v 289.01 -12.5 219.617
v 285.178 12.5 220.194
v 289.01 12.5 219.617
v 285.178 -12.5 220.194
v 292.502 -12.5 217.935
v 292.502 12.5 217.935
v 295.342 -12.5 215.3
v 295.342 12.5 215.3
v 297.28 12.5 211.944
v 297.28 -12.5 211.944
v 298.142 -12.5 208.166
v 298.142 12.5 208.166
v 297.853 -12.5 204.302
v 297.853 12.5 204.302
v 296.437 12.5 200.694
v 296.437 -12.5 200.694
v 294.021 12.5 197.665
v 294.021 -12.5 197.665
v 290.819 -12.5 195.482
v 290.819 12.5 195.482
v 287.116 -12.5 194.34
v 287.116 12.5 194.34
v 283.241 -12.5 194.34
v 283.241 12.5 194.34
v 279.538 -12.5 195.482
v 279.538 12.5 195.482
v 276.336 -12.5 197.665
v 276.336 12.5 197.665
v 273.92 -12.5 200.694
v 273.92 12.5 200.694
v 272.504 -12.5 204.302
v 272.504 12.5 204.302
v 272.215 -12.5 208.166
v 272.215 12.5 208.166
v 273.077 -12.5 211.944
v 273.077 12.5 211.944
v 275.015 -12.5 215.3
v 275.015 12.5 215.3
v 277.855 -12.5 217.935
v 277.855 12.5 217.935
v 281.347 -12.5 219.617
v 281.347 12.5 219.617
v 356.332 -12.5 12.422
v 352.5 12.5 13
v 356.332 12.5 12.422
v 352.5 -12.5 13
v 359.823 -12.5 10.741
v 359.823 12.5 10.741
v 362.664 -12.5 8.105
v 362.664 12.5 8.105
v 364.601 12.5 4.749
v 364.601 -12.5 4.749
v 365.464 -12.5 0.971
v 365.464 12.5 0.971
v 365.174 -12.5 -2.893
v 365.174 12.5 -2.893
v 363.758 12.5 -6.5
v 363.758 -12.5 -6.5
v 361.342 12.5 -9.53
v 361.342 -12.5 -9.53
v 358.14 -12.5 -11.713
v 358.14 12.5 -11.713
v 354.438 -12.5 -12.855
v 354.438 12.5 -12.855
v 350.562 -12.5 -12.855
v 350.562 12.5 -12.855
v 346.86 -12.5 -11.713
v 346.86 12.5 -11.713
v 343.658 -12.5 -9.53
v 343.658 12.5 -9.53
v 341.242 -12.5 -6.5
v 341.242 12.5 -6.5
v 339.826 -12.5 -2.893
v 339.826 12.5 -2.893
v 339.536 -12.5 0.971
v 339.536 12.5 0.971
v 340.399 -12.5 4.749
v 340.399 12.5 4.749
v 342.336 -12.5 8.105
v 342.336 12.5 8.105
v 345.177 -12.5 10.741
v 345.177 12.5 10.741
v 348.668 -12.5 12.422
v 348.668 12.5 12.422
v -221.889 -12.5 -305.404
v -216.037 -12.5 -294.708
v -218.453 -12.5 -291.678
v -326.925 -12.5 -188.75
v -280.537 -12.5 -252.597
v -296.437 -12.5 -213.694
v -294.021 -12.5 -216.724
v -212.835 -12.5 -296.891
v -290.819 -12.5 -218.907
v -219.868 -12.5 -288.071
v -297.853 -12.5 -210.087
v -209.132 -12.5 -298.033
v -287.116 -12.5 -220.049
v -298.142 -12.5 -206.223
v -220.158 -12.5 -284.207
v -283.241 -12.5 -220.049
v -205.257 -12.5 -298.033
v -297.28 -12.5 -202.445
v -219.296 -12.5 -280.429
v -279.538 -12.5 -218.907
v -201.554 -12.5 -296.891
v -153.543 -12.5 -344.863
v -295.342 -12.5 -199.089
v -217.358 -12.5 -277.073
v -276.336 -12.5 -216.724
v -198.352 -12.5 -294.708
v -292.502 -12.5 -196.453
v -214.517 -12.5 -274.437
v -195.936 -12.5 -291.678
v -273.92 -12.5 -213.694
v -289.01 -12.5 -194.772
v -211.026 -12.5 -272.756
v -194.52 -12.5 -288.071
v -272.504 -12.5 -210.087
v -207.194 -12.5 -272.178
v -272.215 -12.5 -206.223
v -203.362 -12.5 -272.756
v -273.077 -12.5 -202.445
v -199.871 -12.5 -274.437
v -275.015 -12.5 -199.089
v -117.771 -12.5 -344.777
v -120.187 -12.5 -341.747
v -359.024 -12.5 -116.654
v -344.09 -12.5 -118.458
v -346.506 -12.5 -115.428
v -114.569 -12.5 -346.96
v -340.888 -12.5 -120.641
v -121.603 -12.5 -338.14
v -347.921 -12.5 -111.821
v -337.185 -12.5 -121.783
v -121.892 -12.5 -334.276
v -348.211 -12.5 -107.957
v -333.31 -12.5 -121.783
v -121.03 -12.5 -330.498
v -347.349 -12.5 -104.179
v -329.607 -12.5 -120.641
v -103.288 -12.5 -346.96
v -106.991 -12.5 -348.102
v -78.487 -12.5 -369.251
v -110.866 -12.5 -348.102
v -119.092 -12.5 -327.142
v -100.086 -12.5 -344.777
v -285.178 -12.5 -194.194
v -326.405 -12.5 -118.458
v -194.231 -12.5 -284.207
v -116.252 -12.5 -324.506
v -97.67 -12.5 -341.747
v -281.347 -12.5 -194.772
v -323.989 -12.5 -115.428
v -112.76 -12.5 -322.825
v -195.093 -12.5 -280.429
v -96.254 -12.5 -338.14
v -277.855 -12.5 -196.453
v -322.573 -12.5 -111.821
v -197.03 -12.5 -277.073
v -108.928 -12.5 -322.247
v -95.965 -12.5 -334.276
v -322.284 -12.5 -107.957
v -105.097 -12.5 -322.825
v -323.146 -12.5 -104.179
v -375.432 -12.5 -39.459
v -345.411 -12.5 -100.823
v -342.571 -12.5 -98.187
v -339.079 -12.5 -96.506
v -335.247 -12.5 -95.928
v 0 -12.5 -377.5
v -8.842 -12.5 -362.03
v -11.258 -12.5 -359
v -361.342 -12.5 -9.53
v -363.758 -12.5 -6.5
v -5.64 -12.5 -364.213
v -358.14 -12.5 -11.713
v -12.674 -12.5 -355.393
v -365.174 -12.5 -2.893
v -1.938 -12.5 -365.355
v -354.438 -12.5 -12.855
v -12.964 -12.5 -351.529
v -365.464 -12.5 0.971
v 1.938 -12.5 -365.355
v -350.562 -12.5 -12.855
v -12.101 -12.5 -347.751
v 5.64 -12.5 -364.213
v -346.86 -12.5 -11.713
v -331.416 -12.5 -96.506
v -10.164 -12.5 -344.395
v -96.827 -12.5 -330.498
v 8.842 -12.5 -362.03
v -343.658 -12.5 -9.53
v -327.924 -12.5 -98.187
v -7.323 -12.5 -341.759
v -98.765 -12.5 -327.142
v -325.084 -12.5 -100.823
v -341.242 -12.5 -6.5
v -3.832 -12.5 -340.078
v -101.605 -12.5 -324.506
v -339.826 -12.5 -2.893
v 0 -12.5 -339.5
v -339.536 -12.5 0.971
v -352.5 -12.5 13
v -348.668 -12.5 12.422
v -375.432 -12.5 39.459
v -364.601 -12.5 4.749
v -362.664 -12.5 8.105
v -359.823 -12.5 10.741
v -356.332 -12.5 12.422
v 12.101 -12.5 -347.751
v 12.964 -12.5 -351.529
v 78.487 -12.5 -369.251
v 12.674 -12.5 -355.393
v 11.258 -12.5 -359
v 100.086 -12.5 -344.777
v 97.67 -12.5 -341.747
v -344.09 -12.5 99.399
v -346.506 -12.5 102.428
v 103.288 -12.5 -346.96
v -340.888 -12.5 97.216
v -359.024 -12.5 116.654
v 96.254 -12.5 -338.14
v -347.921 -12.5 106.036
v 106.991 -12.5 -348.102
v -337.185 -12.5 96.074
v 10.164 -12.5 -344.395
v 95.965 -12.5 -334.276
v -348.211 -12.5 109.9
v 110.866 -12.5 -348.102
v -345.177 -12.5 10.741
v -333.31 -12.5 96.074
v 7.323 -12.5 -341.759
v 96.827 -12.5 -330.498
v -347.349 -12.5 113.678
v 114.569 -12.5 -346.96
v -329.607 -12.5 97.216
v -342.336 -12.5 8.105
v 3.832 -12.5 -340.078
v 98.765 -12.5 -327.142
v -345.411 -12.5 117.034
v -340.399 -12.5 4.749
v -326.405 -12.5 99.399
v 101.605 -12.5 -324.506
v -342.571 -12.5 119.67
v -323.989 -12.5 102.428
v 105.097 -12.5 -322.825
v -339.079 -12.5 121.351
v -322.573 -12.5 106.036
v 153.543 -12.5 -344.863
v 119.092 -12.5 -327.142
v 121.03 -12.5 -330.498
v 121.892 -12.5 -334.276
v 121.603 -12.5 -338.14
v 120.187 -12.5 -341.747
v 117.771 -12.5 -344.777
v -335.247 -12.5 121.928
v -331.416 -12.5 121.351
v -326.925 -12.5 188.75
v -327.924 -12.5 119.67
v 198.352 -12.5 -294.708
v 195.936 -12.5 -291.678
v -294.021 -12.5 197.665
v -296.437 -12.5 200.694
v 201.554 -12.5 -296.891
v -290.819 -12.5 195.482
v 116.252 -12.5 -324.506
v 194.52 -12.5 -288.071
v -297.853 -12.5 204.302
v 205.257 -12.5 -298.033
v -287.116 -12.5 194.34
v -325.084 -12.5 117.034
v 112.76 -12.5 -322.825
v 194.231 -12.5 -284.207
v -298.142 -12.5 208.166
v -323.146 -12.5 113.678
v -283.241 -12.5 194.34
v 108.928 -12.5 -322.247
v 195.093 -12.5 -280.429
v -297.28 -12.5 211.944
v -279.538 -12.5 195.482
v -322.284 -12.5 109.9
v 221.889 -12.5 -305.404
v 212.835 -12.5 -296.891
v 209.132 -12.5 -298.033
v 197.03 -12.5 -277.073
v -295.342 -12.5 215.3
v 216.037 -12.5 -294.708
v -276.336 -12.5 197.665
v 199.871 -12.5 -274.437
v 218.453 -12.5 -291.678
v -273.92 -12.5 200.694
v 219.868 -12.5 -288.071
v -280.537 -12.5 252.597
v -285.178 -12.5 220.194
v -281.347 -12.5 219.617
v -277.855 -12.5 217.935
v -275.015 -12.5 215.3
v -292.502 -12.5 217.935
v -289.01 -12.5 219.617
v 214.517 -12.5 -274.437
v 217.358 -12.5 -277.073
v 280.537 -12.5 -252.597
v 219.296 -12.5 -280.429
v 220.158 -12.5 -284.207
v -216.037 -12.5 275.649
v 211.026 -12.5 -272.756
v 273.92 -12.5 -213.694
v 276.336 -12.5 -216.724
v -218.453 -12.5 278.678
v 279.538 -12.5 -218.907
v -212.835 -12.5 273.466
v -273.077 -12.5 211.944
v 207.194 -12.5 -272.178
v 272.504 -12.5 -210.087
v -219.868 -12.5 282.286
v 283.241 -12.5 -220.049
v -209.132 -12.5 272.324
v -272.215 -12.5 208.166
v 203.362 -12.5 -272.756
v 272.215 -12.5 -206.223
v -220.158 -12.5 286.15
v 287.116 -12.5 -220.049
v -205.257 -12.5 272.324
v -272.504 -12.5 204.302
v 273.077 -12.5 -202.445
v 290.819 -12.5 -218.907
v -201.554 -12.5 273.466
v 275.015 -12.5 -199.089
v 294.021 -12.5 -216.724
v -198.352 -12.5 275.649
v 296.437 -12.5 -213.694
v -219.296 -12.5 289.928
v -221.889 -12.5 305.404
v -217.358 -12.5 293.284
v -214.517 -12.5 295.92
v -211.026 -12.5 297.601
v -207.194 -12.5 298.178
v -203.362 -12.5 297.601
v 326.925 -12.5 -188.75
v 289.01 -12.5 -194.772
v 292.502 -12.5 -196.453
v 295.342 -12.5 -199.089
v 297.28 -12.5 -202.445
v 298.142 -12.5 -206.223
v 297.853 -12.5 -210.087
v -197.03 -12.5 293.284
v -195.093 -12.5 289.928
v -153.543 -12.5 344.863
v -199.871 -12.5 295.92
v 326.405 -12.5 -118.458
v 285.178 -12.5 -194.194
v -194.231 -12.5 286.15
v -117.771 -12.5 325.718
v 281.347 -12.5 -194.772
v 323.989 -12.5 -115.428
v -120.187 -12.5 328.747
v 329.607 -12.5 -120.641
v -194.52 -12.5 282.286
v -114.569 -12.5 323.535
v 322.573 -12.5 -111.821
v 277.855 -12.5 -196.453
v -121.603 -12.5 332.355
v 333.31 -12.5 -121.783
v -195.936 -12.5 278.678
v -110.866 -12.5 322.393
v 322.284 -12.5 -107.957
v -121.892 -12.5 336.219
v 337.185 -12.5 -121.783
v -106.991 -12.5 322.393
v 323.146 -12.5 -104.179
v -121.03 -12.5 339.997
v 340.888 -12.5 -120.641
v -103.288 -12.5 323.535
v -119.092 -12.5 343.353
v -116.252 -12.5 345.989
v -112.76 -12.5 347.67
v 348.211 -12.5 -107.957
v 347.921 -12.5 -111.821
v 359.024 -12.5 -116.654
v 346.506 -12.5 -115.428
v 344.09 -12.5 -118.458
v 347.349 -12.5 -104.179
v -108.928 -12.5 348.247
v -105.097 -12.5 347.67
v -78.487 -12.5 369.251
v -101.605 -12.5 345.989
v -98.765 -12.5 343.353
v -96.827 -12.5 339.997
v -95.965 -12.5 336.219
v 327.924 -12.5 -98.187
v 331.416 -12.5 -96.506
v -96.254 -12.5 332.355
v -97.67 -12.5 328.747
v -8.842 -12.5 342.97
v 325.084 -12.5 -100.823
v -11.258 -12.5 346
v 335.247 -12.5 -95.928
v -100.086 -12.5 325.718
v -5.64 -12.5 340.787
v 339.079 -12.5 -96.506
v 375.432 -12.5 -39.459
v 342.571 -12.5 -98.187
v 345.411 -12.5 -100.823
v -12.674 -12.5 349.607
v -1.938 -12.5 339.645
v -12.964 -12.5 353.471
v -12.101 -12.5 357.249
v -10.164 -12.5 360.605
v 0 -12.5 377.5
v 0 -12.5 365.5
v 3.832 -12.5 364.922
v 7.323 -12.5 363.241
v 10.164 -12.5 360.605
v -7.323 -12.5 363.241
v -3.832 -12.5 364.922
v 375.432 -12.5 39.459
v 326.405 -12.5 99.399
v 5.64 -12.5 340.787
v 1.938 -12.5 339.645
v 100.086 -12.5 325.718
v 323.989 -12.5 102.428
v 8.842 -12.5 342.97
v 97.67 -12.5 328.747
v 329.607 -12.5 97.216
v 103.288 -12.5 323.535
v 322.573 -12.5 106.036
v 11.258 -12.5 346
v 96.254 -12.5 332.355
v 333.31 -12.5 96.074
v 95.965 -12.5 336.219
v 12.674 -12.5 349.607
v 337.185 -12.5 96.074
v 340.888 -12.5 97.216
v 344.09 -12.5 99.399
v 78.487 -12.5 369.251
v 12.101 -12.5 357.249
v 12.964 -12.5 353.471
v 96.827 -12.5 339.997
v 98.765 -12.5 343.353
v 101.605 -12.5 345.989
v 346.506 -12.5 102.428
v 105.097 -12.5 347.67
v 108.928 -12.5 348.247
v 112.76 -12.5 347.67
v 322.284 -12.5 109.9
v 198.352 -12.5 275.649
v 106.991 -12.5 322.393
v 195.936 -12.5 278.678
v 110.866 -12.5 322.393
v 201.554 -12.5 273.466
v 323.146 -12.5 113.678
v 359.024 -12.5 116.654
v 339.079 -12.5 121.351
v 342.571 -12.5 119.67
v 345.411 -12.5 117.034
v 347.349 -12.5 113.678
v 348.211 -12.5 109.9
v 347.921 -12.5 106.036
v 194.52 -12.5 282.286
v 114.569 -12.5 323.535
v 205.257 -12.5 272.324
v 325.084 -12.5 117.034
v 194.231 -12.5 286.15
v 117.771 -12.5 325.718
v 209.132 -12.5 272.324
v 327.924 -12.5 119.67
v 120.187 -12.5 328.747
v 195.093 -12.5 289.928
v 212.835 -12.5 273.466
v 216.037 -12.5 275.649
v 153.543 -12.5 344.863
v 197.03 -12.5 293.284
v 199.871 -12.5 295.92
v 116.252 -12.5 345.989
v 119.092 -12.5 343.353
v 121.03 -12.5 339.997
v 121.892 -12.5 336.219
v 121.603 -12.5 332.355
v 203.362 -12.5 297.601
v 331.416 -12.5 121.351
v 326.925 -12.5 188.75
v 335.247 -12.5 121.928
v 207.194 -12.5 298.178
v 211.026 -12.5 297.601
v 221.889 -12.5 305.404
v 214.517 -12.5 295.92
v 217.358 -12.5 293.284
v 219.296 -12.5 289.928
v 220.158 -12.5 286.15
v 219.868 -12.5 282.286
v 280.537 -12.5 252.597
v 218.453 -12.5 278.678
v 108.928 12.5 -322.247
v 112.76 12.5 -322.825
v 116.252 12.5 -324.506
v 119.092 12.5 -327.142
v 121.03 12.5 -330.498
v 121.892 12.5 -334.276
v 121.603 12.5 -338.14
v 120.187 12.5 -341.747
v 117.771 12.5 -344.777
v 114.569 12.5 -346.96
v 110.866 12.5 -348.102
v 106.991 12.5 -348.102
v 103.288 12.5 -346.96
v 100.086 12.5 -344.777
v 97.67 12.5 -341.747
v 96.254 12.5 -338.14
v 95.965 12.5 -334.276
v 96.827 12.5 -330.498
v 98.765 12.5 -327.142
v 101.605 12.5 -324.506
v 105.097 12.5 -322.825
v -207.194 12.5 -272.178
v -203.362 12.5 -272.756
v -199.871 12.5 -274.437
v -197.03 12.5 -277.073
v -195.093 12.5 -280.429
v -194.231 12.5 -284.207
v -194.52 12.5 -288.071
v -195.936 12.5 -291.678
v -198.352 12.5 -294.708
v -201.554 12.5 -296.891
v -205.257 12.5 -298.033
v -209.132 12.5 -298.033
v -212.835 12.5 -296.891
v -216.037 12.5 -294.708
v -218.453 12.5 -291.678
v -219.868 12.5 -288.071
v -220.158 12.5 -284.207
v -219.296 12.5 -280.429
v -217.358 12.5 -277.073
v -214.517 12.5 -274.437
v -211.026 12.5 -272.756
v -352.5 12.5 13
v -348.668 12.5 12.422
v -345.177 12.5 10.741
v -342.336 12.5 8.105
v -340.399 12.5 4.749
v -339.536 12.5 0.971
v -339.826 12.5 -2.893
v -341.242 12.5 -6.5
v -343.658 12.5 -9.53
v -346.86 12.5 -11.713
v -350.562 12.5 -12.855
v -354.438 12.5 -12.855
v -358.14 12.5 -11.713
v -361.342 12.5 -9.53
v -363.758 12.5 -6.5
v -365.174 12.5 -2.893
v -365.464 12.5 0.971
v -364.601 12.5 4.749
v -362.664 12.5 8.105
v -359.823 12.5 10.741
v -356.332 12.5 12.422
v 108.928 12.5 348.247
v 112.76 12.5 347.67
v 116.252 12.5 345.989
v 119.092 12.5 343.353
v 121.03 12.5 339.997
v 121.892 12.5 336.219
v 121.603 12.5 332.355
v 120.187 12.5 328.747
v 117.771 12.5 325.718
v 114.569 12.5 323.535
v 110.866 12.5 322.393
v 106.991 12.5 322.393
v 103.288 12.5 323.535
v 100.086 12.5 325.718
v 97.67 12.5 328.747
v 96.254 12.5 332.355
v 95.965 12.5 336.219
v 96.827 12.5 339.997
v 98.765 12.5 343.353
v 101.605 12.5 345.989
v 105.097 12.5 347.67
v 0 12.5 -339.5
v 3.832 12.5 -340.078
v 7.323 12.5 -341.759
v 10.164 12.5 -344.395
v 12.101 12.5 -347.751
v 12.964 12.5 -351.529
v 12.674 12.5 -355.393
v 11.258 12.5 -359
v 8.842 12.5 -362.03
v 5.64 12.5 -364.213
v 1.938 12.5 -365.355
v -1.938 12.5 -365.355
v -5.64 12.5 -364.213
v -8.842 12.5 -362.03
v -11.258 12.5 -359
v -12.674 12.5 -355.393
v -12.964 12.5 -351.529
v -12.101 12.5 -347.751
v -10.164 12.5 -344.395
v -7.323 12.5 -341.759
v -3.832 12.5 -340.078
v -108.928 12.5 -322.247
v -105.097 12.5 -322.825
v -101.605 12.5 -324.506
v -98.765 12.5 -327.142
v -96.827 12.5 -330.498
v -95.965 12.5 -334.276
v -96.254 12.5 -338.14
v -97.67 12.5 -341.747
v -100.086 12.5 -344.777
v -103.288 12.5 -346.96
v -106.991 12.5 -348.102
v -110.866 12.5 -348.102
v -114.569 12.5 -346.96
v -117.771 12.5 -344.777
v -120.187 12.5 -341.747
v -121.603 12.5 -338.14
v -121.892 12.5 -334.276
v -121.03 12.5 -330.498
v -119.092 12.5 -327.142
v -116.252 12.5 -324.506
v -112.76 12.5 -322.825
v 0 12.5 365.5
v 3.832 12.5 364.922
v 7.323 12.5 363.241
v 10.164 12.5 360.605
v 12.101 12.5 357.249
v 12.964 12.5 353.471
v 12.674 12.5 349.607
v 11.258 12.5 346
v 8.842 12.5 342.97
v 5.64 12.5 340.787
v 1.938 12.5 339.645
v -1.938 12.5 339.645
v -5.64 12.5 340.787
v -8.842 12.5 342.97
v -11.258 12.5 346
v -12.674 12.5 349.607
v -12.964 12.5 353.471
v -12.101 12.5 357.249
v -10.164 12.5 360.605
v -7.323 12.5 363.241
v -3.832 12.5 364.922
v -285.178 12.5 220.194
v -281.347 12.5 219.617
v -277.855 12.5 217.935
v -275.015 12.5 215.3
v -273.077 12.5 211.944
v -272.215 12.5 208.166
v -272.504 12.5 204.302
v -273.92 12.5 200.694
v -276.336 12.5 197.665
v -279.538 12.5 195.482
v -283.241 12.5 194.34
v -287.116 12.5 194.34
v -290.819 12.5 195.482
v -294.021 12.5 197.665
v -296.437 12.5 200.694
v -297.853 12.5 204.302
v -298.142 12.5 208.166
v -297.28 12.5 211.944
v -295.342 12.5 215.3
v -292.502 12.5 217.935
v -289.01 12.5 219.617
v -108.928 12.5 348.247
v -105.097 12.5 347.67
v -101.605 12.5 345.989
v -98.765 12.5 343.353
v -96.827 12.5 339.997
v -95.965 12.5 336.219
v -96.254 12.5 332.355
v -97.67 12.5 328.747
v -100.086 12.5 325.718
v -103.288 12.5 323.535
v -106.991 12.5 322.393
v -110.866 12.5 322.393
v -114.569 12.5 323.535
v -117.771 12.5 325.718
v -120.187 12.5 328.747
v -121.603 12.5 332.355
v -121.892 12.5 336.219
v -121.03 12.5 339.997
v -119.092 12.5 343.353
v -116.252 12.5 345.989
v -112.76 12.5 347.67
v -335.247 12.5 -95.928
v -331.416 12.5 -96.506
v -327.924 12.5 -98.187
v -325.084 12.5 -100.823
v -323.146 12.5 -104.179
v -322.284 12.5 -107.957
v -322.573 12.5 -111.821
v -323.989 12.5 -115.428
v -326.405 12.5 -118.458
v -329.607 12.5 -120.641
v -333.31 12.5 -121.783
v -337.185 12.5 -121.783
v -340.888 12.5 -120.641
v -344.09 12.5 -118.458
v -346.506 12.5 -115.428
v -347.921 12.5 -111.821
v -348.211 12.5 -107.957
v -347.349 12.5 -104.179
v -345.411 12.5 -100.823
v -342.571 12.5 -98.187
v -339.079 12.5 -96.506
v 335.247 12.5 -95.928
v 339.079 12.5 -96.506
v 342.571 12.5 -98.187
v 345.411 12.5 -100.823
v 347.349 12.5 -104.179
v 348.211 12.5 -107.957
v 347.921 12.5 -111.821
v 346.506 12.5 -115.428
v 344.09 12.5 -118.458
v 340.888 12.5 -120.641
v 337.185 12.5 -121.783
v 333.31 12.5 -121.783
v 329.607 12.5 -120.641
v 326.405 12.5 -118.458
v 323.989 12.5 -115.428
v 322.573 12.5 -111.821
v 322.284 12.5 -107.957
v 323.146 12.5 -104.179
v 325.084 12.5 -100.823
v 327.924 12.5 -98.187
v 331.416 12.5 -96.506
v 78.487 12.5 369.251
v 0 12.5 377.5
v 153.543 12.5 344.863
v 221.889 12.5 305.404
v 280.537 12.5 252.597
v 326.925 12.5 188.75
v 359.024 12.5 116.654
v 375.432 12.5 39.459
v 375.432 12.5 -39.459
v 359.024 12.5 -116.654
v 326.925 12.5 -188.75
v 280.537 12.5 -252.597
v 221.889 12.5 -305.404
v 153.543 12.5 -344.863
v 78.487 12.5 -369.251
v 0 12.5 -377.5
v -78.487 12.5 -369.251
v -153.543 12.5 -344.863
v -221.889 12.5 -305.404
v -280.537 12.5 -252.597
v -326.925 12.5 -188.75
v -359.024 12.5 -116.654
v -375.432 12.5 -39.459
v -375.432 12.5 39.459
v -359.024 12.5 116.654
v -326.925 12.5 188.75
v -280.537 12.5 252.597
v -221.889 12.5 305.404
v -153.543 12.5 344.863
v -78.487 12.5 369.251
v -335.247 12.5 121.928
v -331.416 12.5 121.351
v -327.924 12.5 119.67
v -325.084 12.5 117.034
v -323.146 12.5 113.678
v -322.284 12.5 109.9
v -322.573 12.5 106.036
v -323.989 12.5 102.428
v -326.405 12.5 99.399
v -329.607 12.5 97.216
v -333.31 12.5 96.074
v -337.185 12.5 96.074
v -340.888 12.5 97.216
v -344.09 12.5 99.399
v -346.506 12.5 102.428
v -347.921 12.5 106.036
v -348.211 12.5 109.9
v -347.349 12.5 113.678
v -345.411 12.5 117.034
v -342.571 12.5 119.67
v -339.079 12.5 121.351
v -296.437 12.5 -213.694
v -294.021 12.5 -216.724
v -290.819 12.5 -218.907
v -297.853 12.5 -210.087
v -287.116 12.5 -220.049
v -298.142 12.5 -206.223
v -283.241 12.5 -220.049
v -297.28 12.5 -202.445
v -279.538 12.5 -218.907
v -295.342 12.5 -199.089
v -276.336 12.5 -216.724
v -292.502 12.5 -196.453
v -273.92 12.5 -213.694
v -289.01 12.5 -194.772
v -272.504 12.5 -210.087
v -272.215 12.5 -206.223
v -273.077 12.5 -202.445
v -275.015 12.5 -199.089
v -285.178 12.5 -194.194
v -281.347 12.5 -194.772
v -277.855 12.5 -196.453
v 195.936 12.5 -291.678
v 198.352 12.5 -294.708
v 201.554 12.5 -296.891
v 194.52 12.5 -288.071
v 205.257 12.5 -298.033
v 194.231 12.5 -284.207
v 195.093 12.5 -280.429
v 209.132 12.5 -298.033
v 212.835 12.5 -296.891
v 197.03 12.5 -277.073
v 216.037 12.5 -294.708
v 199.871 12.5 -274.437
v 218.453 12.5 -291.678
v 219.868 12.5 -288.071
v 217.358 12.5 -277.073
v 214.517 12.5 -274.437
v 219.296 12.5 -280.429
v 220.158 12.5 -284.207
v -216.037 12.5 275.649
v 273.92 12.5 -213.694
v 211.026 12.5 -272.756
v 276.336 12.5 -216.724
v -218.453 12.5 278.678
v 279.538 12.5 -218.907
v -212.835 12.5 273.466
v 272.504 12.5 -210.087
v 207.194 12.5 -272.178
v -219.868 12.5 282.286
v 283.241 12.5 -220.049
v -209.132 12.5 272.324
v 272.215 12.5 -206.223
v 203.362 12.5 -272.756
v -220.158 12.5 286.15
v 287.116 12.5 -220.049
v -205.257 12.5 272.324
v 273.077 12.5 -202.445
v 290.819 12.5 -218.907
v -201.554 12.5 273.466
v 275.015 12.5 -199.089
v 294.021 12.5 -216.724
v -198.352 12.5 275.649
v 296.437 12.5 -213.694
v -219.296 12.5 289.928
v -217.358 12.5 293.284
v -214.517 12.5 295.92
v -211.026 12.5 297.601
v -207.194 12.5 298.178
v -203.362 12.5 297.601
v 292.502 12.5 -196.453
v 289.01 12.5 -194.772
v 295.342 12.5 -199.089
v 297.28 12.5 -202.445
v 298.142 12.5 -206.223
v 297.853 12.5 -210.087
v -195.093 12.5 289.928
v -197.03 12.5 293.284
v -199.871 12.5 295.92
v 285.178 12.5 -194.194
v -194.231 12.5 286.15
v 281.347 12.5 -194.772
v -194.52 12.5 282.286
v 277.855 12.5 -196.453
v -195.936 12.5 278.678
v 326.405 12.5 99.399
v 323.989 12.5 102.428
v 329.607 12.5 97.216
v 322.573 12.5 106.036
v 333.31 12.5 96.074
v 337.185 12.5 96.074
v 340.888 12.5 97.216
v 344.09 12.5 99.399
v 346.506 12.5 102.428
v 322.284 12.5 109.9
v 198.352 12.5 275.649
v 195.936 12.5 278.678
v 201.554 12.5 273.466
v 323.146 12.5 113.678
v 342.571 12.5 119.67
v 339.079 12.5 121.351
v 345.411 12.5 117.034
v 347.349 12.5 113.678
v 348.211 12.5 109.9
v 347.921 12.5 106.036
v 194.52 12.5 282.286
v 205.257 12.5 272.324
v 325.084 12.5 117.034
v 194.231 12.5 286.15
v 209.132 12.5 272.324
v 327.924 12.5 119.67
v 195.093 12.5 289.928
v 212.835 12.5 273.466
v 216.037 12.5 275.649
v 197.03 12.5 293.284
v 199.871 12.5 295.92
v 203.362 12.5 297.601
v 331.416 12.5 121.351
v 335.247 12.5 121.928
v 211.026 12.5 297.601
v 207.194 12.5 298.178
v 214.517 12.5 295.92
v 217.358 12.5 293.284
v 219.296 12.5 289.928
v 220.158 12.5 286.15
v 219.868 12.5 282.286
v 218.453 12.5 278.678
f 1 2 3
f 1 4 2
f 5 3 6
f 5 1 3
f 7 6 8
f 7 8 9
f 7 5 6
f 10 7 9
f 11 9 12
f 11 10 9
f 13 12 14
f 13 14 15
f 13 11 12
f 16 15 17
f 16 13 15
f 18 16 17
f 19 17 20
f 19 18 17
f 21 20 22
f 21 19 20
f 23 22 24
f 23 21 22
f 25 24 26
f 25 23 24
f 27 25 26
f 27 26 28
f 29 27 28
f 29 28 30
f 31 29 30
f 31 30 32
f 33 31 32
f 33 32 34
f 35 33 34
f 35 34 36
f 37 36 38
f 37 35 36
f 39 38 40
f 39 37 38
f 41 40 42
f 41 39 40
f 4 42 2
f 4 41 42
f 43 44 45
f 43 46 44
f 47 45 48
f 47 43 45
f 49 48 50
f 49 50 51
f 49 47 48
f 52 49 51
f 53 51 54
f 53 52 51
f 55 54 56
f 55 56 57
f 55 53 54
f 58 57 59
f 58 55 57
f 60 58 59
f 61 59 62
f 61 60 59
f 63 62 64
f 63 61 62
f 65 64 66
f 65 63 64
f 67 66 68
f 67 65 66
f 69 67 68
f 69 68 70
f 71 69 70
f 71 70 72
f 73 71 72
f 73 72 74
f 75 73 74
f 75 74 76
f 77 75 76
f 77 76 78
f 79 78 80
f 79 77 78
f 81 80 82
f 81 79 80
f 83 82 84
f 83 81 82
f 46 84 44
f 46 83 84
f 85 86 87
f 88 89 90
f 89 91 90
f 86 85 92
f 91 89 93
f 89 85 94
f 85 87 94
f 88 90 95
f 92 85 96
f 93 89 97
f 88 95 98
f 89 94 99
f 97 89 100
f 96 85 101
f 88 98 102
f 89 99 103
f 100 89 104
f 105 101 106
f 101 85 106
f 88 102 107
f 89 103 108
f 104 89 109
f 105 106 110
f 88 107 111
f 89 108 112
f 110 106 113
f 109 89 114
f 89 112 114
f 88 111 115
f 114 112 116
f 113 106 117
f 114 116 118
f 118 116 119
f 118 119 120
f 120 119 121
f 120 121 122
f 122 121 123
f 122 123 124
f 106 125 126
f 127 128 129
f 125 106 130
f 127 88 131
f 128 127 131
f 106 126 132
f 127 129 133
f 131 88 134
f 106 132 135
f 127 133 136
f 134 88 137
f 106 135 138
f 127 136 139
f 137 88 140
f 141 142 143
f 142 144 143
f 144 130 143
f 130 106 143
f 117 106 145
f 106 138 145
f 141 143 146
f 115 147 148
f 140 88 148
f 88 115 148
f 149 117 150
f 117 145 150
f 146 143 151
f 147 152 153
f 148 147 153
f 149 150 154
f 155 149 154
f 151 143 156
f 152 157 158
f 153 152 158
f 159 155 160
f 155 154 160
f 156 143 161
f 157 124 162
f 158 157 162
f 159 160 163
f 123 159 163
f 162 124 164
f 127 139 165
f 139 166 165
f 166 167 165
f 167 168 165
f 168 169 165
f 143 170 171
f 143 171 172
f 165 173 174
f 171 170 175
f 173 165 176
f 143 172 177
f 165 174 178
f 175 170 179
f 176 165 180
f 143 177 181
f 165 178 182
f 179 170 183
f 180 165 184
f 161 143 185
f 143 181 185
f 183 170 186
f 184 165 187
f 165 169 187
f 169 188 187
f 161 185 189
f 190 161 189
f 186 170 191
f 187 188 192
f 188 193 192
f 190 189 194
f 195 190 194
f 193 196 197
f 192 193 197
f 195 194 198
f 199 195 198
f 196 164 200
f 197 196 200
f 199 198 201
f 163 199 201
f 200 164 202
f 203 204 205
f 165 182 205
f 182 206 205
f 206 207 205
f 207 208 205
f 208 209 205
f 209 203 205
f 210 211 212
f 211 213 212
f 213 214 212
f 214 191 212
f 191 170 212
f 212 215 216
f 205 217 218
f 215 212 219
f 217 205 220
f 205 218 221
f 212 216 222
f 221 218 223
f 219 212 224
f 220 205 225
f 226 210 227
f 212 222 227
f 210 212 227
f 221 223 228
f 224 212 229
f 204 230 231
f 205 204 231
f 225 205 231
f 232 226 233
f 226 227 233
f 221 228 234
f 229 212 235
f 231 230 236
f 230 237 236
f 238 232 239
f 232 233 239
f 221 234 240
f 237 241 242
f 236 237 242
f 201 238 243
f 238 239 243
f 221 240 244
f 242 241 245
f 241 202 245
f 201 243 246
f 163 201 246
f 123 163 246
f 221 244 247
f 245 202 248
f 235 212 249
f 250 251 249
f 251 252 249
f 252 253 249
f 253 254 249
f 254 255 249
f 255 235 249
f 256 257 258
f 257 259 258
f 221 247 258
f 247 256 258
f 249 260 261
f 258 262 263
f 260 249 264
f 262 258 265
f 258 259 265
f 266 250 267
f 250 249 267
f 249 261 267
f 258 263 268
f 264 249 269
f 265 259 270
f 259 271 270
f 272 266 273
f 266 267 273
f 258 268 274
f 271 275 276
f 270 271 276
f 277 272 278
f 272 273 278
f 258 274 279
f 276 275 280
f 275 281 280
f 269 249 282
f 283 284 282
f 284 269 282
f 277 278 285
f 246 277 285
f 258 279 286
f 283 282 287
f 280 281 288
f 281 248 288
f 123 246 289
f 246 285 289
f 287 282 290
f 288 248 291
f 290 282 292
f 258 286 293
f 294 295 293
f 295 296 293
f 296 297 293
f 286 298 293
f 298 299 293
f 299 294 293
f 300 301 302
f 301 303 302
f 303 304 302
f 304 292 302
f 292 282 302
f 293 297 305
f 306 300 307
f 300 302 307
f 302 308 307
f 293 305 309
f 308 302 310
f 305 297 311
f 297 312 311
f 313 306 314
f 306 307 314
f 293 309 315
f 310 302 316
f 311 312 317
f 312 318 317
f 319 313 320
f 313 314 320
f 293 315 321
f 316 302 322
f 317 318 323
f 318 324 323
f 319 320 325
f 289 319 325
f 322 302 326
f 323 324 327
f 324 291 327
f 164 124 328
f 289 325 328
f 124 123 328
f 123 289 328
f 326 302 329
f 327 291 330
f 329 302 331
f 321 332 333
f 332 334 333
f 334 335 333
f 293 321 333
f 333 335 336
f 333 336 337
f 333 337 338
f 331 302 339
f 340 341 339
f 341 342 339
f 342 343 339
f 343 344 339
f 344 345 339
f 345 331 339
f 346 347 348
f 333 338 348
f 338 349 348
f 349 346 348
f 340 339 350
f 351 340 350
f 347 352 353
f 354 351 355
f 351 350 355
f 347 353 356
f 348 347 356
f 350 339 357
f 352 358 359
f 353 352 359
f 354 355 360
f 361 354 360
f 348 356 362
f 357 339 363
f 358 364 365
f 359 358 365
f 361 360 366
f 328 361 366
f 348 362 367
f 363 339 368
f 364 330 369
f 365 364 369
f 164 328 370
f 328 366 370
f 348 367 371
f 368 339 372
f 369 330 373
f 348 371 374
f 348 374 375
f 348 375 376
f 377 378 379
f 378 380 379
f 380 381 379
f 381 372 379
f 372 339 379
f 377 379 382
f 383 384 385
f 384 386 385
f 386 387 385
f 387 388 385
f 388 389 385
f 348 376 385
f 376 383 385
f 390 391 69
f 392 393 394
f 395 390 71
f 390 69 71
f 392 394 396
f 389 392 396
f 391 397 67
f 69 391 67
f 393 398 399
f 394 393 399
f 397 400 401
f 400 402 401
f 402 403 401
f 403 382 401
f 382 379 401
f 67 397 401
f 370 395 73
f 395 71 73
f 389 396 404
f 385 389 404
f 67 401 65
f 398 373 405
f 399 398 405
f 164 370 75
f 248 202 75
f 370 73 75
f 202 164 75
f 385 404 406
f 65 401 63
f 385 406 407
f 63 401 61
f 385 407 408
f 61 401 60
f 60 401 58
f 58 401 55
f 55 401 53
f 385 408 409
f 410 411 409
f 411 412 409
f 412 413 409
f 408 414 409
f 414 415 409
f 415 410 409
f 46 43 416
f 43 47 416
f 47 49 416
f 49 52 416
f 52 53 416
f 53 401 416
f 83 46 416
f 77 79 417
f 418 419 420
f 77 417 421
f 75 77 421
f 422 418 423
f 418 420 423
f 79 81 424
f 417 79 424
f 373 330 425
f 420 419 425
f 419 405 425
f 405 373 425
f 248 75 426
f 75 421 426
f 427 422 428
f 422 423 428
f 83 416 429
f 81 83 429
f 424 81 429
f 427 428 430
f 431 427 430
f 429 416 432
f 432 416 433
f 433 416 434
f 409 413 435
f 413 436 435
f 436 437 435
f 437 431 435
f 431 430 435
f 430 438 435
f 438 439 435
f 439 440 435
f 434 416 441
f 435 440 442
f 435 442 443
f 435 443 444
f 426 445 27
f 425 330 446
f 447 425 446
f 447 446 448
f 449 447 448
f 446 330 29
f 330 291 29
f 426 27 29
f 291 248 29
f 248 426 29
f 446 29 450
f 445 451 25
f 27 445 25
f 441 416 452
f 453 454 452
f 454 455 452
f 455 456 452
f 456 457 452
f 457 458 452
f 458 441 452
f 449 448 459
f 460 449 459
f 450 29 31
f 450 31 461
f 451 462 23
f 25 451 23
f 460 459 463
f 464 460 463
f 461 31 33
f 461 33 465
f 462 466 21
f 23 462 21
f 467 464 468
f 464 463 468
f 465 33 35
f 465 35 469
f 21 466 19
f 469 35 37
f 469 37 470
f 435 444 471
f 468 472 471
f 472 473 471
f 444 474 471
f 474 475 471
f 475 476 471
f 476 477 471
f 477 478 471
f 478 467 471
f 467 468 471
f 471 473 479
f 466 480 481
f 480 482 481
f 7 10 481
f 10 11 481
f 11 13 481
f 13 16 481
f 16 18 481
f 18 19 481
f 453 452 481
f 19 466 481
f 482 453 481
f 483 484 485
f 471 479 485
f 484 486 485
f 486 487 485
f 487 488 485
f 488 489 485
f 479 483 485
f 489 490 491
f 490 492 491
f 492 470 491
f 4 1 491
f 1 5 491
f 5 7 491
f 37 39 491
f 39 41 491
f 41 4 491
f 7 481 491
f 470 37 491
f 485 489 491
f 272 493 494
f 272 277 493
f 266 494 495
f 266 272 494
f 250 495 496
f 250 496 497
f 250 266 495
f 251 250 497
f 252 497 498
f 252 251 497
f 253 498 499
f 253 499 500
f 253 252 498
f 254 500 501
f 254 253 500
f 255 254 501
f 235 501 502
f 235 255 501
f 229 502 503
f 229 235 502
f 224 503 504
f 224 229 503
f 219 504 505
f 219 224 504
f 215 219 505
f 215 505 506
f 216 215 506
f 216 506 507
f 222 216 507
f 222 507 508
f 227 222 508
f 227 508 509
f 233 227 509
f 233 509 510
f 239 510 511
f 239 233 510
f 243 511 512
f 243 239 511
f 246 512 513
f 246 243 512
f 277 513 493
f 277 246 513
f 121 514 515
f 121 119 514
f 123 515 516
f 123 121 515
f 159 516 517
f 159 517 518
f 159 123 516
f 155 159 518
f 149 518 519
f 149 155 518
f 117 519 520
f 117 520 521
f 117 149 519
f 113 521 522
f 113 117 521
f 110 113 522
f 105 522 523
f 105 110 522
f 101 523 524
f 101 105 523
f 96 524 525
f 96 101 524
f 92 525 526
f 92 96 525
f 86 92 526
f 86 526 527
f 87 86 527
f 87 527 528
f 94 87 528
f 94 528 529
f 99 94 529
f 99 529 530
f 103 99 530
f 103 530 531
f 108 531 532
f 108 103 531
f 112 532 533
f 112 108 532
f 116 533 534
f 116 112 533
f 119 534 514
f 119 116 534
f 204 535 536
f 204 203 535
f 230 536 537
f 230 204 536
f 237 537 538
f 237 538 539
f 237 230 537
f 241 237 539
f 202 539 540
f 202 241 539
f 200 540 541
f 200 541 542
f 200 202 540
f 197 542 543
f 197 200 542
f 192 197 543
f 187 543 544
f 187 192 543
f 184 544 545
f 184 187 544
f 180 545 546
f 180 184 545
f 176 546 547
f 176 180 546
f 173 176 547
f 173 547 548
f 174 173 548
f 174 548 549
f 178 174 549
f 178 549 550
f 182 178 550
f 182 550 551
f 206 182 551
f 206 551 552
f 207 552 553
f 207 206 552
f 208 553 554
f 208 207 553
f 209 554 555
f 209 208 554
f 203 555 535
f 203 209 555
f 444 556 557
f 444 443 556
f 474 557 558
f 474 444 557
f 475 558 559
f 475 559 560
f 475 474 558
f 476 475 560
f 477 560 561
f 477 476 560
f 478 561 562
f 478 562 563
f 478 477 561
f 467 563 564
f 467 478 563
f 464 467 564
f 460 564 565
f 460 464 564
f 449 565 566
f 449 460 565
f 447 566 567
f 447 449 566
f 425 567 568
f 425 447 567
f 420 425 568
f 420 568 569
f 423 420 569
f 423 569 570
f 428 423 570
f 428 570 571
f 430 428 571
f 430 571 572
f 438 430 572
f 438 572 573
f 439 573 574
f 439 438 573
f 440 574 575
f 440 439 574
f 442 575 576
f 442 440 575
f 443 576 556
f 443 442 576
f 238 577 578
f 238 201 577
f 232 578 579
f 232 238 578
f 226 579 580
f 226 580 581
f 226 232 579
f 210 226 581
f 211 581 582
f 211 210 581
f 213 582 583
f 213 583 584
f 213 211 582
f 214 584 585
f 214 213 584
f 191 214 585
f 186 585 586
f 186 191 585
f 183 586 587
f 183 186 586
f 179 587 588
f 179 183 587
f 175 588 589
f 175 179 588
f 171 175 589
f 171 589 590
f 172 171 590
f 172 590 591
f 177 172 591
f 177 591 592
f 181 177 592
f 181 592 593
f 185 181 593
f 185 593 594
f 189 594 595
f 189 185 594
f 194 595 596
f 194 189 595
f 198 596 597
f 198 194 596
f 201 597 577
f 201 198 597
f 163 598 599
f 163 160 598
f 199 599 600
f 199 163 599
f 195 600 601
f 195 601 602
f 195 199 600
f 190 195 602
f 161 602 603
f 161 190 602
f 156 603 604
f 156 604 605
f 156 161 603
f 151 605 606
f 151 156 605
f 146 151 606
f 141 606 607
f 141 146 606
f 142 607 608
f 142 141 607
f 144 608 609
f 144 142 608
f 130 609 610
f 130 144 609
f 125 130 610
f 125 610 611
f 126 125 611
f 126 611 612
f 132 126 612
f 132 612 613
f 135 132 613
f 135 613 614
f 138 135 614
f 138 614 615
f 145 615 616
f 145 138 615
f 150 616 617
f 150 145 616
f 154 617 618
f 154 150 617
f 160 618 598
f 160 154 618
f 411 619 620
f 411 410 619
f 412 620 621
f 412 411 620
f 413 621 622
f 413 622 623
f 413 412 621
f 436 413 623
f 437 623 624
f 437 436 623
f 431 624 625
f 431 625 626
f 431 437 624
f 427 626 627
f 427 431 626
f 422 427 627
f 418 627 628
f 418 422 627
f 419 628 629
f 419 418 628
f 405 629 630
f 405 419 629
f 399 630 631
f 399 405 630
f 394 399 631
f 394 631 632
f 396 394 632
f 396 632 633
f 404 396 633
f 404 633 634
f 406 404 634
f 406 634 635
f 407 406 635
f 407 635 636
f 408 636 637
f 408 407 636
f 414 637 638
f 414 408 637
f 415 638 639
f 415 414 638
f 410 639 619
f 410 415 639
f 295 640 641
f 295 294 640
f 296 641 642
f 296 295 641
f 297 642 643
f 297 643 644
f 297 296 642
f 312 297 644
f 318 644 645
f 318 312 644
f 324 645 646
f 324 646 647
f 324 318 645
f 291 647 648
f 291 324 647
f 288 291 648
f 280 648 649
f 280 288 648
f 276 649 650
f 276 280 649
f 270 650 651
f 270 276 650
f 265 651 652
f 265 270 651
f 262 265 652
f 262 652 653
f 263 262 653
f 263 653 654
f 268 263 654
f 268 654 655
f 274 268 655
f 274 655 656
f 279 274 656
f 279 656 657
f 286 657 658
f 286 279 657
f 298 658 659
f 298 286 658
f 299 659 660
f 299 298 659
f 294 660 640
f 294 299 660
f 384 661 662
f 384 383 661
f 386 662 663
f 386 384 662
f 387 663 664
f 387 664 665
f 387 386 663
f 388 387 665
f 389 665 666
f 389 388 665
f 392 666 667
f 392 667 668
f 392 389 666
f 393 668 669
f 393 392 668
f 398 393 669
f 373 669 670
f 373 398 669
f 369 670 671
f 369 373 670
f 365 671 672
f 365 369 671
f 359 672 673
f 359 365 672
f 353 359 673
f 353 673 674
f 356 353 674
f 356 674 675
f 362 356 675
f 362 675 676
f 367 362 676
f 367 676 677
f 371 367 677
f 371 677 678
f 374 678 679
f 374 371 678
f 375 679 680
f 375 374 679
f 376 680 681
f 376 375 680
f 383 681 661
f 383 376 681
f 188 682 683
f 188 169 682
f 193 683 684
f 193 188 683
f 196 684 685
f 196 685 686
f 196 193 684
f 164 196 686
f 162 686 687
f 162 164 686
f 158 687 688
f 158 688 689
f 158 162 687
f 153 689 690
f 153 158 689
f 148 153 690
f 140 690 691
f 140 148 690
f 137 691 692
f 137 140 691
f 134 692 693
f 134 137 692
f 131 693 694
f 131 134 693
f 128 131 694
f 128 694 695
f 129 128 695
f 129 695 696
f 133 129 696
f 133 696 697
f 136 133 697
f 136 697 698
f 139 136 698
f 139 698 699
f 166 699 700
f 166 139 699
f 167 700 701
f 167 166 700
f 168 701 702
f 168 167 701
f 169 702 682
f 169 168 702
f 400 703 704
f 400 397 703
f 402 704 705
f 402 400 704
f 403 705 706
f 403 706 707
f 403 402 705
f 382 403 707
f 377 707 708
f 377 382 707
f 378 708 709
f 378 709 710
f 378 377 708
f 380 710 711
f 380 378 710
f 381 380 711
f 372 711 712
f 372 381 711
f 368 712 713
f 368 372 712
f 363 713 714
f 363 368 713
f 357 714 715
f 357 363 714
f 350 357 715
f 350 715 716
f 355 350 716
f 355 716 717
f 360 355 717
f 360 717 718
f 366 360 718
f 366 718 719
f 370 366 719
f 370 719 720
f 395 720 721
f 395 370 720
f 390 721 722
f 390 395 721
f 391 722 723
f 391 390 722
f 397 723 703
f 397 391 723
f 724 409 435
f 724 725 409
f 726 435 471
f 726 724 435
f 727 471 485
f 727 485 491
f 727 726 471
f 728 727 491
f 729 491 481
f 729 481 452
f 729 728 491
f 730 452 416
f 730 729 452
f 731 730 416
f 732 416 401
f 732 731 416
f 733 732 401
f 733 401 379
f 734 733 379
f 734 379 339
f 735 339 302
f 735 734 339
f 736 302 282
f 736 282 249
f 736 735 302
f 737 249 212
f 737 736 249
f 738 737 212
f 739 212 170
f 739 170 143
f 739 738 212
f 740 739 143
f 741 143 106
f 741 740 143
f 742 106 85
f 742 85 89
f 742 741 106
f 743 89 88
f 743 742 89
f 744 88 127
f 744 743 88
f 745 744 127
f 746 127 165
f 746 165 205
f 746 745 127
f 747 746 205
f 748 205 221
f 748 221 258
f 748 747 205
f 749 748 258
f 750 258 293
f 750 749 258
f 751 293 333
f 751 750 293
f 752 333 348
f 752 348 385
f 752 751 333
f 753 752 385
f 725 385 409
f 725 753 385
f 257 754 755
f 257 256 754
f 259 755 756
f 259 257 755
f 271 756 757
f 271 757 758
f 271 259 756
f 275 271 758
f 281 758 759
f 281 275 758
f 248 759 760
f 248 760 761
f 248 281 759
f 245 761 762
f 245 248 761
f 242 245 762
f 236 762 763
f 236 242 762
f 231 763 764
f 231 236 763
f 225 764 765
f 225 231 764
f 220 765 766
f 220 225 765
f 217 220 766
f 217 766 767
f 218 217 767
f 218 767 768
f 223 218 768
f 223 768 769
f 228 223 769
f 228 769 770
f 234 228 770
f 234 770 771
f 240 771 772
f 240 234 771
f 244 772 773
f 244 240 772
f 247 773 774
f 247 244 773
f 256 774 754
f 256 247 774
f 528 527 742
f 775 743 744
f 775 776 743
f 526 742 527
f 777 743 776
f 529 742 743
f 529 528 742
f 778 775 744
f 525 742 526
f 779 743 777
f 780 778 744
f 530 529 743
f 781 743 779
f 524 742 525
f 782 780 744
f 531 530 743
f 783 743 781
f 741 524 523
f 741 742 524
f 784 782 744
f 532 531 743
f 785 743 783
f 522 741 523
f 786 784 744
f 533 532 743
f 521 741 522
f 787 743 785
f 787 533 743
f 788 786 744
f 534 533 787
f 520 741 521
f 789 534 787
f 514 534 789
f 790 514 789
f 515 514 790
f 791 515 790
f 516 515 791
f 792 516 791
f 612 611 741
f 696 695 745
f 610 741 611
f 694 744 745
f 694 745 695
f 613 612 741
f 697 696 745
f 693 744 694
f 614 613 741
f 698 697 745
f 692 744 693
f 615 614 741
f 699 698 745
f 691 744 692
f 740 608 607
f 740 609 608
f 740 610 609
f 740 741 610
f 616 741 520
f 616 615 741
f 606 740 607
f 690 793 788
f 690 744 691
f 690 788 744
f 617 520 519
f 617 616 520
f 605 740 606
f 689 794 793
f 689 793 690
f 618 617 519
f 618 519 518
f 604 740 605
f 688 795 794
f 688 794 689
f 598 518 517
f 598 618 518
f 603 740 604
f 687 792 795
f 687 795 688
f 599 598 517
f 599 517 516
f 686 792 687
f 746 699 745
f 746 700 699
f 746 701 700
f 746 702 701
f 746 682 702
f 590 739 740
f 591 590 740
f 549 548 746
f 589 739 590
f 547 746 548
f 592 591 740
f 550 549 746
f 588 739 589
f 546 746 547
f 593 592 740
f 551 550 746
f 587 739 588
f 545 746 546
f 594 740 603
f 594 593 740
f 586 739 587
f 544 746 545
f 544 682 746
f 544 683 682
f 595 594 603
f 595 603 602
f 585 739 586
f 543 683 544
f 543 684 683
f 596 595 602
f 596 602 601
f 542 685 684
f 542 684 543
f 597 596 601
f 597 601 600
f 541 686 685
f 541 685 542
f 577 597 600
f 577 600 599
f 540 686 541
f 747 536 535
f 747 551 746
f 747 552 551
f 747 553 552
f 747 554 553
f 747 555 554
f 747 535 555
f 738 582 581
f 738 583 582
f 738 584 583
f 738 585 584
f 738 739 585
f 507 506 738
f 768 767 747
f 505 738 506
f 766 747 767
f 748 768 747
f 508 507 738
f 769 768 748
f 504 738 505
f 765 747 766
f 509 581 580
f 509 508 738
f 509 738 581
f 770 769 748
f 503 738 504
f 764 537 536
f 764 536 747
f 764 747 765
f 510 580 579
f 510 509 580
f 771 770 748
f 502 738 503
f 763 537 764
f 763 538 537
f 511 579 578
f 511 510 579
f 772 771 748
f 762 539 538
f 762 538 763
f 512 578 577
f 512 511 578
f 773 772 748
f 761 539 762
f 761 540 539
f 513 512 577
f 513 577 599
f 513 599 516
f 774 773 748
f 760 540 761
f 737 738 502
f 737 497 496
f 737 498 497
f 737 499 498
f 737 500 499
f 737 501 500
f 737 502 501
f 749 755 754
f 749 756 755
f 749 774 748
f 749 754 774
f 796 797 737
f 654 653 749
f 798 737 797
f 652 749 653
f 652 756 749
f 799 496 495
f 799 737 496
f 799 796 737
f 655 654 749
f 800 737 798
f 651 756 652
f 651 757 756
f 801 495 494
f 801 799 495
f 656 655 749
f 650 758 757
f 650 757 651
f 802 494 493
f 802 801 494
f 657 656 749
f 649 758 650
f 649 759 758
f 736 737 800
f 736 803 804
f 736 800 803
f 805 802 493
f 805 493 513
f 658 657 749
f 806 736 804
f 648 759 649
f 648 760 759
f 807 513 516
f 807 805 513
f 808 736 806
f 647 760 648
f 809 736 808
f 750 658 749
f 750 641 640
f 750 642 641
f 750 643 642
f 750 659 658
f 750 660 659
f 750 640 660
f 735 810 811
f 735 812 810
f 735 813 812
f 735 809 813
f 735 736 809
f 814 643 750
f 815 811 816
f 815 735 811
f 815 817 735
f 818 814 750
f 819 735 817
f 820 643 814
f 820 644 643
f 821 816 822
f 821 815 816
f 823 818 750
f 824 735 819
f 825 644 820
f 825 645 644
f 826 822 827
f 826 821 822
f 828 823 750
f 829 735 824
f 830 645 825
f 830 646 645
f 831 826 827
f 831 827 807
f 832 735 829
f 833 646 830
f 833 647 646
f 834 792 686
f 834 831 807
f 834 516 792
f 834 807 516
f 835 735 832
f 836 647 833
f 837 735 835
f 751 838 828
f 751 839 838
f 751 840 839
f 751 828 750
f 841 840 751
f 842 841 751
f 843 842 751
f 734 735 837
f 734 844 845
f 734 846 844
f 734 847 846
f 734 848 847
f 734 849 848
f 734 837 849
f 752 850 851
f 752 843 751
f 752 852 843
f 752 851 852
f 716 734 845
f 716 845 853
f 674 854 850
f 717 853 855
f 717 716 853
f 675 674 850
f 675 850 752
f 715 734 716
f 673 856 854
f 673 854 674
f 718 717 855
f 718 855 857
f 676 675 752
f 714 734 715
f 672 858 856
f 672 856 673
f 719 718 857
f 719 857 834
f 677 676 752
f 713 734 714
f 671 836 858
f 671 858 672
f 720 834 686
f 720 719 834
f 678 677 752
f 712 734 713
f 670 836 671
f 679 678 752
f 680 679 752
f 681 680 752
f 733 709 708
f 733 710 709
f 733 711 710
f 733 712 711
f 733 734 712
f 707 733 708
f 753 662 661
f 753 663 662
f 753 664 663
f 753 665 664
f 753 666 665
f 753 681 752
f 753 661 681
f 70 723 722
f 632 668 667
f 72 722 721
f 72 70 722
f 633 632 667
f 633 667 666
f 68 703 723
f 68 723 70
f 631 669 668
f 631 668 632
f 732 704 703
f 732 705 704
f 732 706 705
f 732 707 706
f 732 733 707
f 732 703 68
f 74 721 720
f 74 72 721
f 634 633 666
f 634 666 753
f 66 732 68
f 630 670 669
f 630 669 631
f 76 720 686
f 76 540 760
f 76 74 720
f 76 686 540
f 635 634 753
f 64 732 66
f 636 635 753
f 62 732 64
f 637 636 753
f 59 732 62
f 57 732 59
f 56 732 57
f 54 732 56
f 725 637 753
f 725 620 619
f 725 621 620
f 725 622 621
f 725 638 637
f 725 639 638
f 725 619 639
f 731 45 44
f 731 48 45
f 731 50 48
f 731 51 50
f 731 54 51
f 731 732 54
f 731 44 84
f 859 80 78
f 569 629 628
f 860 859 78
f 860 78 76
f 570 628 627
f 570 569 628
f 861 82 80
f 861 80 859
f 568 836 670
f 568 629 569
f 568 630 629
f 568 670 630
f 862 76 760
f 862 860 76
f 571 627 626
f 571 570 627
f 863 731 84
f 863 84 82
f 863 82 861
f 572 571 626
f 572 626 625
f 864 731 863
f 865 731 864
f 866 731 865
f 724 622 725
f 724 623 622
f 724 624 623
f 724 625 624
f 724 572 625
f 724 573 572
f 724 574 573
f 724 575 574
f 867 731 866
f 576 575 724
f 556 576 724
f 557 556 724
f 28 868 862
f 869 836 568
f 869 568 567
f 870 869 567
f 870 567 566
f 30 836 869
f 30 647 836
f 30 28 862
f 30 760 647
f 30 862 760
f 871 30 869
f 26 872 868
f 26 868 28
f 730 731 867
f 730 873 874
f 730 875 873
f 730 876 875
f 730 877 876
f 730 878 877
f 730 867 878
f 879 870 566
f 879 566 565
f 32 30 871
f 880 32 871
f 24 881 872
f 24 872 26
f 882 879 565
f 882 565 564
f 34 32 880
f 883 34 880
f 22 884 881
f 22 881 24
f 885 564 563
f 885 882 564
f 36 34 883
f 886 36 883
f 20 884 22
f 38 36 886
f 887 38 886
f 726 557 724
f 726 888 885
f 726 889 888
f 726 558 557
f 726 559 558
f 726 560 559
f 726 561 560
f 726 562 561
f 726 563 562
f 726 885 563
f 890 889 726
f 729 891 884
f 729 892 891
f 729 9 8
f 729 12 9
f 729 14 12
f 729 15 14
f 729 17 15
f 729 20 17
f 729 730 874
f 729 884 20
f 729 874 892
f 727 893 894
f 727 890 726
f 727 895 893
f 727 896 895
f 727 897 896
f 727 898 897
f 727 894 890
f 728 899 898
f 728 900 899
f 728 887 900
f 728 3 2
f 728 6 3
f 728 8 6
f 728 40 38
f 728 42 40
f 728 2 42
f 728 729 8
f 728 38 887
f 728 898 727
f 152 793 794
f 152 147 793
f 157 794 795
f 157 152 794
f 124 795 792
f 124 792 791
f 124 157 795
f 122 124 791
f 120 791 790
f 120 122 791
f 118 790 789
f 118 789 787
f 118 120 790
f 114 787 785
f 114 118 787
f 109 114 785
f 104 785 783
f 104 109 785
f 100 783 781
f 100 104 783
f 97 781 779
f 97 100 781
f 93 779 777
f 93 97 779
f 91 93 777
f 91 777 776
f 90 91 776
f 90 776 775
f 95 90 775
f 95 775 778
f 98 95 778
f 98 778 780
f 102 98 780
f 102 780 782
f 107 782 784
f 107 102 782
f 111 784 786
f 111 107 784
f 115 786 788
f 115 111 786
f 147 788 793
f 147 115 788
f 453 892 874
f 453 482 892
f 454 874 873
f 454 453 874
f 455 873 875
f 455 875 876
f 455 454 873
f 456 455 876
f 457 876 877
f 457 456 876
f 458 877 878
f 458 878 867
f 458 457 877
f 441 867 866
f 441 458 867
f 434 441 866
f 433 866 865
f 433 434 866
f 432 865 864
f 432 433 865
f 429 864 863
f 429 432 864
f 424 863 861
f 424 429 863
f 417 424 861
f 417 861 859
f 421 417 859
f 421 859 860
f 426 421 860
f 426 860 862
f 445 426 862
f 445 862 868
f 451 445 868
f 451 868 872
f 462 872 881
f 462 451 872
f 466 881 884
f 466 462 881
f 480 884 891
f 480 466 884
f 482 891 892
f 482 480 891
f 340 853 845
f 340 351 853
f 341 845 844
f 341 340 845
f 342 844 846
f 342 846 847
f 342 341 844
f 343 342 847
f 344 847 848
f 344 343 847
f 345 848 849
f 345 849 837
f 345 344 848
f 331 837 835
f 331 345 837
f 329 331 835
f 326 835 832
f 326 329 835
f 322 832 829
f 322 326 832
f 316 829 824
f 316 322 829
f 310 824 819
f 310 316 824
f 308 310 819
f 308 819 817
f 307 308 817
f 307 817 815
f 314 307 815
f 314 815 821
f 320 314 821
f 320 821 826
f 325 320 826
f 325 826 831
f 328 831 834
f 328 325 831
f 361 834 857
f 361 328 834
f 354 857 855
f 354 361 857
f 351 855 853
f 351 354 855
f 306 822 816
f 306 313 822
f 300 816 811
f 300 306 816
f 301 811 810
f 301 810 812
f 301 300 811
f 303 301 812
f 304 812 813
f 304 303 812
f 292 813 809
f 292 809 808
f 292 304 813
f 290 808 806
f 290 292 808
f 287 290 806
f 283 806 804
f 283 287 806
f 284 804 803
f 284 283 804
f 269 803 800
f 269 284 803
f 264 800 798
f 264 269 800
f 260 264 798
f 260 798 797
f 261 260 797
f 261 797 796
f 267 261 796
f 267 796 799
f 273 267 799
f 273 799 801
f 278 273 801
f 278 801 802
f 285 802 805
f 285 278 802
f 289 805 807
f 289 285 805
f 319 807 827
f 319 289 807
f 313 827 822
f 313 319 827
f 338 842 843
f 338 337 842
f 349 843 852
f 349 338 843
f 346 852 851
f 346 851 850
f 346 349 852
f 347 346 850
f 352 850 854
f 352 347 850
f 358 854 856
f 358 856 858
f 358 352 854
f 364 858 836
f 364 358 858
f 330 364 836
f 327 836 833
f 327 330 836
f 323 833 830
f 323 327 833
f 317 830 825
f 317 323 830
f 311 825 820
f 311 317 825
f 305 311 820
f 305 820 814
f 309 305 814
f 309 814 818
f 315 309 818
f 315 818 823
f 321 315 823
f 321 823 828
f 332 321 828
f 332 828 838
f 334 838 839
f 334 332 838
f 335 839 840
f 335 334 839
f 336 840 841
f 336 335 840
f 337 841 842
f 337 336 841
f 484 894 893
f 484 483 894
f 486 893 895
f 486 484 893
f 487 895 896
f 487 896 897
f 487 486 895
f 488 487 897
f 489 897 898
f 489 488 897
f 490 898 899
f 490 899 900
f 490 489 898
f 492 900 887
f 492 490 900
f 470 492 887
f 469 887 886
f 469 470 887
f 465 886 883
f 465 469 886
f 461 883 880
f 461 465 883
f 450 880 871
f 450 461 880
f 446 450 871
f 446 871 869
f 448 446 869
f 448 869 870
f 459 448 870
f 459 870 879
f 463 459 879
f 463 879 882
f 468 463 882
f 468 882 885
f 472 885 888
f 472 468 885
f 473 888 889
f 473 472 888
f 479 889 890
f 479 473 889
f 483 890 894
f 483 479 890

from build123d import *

# Parameters (mm, degrees)
SKETCH1_R           = 377.5
SKETCH1_R_2         = 13
BOSS_EXTRUDE1_DEPTH = 12.5


with BuildPart() as part:
    # Sketch1 → Boss-Extrude1 (new, symmetric)
    with BuildSketch(Plane(origin=(0, 0, 0), x_dir=(1, 0, 0), z_dir=(0, 1, 0))):
        with Locations(Location((0, 0, 0), (0, 0, 270))):
            Circle(SKETCH1_R)
        with Locations(Location((0, 352.5, 0), (0, 0, 270))):
            Circle(SKETCH1_R_2, mode=Mode.SUBTRACT)
        with Locations(Location((108.928490517, 335.247421994, 0), (0, 0, 270))):
            Circle(SKETCH1_R_2, mode=Mode.SUBTRACT)
        with Locations(Location((207.194301433, 285.178490517, 0), (0, 0, 270))):
            Circle(SKETCH1_R_2, mode=Mode.SUBTRACT)
        with Locations(Location((285.178490517, 207.194301433, 0), (0, 0, 270))):
            Circle(SKETCH1_R_2, mode=Mode.SUBTRACT)
        with Locations(Location((335.247421994, 108.928490517, 0), (0, 0, 270))):
            Circle(SKETCH1_R_2, mode=Mode.SUBTRACT)
        with Locations(Location((352.5, 0, 0), (0, 0, 270))):
            Circle(SKETCH1_R_2, mode=Mode.SUBTRACT)
        with Locations(Location((335.247421994, -108.928490517, 0), (0, 0, 270))):
            Circle(SKETCH1_R_2, mode=Mode.SUBTRACT)
        with Locations(Location((285.178490517, -207.194301433, 0), (0, 0, 270))):
            Circle(SKETCH1_R_2, mode=Mode.SUBTRACT)
        with Locations(Location((207.194301433, -285.178490517, 0), (0, 0, 270))):
            Circle(SKETCH1_R_2, mode=Mode.SUBTRACT)
        with Locations(Location((108.928490517, -335.247421994, 0), (0, 0, 270))):
            Circle(SKETCH1_R_2, mode=Mode.SUBTRACT)
        with Locations(Location((0, -352.5, 0), (0, 0, 270))):
            Circle(SKETCH1_R_2, mode=Mode.SUBTRACT)
        with Locations(Location((-108.928490517, -335.247421994, 0), (0, 0, 270))):
            Circle(SKETCH1_R_2, mode=Mode.SUBTRACT)
        with Locations(Location((-207.194301433, -285.178490517, 0), (0, 0, 270))):
            Circle(SKETCH1_R_2, mode=Mode.SUBTRACT)
        with Locations(Location((-285.178490517, -207.194301433, 0), (0, 0, 270))):
            Circle(SKETCH1_R_2, mode=Mode.SUBTRACT)
        with Locations(Location((-335.247421994, -108.928490517, 0), (0, 0, 270))):
            Circle(SKETCH1_R_2, mode=Mode.SUBTRACT)
        with Locations(Location((-352.5, 0, 0), (0, 0, 270))):
            Circle(SKETCH1_R_2, mode=Mode.SUBTRACT)
        with Locations(Location((-335.247421994, 108.928490517, 0), (0, 0, 270))):
            Circle(SKETCH1_R_2, mode=Mode.SUBTRACT)
        with Locations(Location((-285.178490517, 207.194301433, 0), (0, 0, 270))):
            Circle(SKETCH1_R_2, mode=Mode.SUBTRACT)
        with Locations(Location((-207.194301433, 285.178490517, 0), (0, 0, 270))):
            Circle(SKETCH1_R_2, mode=Mode.SUBTRACT)
        with Locations(Location((-108.928490517, 335.247421994, 0), (0, 0, 270))):
            Circle(SKETCH1_R_2, mode=Mode.SUBTRACT)
    extrude(amount=BOSS_EXTRUDE1_DEPTH, both=True)


solid = part.part
